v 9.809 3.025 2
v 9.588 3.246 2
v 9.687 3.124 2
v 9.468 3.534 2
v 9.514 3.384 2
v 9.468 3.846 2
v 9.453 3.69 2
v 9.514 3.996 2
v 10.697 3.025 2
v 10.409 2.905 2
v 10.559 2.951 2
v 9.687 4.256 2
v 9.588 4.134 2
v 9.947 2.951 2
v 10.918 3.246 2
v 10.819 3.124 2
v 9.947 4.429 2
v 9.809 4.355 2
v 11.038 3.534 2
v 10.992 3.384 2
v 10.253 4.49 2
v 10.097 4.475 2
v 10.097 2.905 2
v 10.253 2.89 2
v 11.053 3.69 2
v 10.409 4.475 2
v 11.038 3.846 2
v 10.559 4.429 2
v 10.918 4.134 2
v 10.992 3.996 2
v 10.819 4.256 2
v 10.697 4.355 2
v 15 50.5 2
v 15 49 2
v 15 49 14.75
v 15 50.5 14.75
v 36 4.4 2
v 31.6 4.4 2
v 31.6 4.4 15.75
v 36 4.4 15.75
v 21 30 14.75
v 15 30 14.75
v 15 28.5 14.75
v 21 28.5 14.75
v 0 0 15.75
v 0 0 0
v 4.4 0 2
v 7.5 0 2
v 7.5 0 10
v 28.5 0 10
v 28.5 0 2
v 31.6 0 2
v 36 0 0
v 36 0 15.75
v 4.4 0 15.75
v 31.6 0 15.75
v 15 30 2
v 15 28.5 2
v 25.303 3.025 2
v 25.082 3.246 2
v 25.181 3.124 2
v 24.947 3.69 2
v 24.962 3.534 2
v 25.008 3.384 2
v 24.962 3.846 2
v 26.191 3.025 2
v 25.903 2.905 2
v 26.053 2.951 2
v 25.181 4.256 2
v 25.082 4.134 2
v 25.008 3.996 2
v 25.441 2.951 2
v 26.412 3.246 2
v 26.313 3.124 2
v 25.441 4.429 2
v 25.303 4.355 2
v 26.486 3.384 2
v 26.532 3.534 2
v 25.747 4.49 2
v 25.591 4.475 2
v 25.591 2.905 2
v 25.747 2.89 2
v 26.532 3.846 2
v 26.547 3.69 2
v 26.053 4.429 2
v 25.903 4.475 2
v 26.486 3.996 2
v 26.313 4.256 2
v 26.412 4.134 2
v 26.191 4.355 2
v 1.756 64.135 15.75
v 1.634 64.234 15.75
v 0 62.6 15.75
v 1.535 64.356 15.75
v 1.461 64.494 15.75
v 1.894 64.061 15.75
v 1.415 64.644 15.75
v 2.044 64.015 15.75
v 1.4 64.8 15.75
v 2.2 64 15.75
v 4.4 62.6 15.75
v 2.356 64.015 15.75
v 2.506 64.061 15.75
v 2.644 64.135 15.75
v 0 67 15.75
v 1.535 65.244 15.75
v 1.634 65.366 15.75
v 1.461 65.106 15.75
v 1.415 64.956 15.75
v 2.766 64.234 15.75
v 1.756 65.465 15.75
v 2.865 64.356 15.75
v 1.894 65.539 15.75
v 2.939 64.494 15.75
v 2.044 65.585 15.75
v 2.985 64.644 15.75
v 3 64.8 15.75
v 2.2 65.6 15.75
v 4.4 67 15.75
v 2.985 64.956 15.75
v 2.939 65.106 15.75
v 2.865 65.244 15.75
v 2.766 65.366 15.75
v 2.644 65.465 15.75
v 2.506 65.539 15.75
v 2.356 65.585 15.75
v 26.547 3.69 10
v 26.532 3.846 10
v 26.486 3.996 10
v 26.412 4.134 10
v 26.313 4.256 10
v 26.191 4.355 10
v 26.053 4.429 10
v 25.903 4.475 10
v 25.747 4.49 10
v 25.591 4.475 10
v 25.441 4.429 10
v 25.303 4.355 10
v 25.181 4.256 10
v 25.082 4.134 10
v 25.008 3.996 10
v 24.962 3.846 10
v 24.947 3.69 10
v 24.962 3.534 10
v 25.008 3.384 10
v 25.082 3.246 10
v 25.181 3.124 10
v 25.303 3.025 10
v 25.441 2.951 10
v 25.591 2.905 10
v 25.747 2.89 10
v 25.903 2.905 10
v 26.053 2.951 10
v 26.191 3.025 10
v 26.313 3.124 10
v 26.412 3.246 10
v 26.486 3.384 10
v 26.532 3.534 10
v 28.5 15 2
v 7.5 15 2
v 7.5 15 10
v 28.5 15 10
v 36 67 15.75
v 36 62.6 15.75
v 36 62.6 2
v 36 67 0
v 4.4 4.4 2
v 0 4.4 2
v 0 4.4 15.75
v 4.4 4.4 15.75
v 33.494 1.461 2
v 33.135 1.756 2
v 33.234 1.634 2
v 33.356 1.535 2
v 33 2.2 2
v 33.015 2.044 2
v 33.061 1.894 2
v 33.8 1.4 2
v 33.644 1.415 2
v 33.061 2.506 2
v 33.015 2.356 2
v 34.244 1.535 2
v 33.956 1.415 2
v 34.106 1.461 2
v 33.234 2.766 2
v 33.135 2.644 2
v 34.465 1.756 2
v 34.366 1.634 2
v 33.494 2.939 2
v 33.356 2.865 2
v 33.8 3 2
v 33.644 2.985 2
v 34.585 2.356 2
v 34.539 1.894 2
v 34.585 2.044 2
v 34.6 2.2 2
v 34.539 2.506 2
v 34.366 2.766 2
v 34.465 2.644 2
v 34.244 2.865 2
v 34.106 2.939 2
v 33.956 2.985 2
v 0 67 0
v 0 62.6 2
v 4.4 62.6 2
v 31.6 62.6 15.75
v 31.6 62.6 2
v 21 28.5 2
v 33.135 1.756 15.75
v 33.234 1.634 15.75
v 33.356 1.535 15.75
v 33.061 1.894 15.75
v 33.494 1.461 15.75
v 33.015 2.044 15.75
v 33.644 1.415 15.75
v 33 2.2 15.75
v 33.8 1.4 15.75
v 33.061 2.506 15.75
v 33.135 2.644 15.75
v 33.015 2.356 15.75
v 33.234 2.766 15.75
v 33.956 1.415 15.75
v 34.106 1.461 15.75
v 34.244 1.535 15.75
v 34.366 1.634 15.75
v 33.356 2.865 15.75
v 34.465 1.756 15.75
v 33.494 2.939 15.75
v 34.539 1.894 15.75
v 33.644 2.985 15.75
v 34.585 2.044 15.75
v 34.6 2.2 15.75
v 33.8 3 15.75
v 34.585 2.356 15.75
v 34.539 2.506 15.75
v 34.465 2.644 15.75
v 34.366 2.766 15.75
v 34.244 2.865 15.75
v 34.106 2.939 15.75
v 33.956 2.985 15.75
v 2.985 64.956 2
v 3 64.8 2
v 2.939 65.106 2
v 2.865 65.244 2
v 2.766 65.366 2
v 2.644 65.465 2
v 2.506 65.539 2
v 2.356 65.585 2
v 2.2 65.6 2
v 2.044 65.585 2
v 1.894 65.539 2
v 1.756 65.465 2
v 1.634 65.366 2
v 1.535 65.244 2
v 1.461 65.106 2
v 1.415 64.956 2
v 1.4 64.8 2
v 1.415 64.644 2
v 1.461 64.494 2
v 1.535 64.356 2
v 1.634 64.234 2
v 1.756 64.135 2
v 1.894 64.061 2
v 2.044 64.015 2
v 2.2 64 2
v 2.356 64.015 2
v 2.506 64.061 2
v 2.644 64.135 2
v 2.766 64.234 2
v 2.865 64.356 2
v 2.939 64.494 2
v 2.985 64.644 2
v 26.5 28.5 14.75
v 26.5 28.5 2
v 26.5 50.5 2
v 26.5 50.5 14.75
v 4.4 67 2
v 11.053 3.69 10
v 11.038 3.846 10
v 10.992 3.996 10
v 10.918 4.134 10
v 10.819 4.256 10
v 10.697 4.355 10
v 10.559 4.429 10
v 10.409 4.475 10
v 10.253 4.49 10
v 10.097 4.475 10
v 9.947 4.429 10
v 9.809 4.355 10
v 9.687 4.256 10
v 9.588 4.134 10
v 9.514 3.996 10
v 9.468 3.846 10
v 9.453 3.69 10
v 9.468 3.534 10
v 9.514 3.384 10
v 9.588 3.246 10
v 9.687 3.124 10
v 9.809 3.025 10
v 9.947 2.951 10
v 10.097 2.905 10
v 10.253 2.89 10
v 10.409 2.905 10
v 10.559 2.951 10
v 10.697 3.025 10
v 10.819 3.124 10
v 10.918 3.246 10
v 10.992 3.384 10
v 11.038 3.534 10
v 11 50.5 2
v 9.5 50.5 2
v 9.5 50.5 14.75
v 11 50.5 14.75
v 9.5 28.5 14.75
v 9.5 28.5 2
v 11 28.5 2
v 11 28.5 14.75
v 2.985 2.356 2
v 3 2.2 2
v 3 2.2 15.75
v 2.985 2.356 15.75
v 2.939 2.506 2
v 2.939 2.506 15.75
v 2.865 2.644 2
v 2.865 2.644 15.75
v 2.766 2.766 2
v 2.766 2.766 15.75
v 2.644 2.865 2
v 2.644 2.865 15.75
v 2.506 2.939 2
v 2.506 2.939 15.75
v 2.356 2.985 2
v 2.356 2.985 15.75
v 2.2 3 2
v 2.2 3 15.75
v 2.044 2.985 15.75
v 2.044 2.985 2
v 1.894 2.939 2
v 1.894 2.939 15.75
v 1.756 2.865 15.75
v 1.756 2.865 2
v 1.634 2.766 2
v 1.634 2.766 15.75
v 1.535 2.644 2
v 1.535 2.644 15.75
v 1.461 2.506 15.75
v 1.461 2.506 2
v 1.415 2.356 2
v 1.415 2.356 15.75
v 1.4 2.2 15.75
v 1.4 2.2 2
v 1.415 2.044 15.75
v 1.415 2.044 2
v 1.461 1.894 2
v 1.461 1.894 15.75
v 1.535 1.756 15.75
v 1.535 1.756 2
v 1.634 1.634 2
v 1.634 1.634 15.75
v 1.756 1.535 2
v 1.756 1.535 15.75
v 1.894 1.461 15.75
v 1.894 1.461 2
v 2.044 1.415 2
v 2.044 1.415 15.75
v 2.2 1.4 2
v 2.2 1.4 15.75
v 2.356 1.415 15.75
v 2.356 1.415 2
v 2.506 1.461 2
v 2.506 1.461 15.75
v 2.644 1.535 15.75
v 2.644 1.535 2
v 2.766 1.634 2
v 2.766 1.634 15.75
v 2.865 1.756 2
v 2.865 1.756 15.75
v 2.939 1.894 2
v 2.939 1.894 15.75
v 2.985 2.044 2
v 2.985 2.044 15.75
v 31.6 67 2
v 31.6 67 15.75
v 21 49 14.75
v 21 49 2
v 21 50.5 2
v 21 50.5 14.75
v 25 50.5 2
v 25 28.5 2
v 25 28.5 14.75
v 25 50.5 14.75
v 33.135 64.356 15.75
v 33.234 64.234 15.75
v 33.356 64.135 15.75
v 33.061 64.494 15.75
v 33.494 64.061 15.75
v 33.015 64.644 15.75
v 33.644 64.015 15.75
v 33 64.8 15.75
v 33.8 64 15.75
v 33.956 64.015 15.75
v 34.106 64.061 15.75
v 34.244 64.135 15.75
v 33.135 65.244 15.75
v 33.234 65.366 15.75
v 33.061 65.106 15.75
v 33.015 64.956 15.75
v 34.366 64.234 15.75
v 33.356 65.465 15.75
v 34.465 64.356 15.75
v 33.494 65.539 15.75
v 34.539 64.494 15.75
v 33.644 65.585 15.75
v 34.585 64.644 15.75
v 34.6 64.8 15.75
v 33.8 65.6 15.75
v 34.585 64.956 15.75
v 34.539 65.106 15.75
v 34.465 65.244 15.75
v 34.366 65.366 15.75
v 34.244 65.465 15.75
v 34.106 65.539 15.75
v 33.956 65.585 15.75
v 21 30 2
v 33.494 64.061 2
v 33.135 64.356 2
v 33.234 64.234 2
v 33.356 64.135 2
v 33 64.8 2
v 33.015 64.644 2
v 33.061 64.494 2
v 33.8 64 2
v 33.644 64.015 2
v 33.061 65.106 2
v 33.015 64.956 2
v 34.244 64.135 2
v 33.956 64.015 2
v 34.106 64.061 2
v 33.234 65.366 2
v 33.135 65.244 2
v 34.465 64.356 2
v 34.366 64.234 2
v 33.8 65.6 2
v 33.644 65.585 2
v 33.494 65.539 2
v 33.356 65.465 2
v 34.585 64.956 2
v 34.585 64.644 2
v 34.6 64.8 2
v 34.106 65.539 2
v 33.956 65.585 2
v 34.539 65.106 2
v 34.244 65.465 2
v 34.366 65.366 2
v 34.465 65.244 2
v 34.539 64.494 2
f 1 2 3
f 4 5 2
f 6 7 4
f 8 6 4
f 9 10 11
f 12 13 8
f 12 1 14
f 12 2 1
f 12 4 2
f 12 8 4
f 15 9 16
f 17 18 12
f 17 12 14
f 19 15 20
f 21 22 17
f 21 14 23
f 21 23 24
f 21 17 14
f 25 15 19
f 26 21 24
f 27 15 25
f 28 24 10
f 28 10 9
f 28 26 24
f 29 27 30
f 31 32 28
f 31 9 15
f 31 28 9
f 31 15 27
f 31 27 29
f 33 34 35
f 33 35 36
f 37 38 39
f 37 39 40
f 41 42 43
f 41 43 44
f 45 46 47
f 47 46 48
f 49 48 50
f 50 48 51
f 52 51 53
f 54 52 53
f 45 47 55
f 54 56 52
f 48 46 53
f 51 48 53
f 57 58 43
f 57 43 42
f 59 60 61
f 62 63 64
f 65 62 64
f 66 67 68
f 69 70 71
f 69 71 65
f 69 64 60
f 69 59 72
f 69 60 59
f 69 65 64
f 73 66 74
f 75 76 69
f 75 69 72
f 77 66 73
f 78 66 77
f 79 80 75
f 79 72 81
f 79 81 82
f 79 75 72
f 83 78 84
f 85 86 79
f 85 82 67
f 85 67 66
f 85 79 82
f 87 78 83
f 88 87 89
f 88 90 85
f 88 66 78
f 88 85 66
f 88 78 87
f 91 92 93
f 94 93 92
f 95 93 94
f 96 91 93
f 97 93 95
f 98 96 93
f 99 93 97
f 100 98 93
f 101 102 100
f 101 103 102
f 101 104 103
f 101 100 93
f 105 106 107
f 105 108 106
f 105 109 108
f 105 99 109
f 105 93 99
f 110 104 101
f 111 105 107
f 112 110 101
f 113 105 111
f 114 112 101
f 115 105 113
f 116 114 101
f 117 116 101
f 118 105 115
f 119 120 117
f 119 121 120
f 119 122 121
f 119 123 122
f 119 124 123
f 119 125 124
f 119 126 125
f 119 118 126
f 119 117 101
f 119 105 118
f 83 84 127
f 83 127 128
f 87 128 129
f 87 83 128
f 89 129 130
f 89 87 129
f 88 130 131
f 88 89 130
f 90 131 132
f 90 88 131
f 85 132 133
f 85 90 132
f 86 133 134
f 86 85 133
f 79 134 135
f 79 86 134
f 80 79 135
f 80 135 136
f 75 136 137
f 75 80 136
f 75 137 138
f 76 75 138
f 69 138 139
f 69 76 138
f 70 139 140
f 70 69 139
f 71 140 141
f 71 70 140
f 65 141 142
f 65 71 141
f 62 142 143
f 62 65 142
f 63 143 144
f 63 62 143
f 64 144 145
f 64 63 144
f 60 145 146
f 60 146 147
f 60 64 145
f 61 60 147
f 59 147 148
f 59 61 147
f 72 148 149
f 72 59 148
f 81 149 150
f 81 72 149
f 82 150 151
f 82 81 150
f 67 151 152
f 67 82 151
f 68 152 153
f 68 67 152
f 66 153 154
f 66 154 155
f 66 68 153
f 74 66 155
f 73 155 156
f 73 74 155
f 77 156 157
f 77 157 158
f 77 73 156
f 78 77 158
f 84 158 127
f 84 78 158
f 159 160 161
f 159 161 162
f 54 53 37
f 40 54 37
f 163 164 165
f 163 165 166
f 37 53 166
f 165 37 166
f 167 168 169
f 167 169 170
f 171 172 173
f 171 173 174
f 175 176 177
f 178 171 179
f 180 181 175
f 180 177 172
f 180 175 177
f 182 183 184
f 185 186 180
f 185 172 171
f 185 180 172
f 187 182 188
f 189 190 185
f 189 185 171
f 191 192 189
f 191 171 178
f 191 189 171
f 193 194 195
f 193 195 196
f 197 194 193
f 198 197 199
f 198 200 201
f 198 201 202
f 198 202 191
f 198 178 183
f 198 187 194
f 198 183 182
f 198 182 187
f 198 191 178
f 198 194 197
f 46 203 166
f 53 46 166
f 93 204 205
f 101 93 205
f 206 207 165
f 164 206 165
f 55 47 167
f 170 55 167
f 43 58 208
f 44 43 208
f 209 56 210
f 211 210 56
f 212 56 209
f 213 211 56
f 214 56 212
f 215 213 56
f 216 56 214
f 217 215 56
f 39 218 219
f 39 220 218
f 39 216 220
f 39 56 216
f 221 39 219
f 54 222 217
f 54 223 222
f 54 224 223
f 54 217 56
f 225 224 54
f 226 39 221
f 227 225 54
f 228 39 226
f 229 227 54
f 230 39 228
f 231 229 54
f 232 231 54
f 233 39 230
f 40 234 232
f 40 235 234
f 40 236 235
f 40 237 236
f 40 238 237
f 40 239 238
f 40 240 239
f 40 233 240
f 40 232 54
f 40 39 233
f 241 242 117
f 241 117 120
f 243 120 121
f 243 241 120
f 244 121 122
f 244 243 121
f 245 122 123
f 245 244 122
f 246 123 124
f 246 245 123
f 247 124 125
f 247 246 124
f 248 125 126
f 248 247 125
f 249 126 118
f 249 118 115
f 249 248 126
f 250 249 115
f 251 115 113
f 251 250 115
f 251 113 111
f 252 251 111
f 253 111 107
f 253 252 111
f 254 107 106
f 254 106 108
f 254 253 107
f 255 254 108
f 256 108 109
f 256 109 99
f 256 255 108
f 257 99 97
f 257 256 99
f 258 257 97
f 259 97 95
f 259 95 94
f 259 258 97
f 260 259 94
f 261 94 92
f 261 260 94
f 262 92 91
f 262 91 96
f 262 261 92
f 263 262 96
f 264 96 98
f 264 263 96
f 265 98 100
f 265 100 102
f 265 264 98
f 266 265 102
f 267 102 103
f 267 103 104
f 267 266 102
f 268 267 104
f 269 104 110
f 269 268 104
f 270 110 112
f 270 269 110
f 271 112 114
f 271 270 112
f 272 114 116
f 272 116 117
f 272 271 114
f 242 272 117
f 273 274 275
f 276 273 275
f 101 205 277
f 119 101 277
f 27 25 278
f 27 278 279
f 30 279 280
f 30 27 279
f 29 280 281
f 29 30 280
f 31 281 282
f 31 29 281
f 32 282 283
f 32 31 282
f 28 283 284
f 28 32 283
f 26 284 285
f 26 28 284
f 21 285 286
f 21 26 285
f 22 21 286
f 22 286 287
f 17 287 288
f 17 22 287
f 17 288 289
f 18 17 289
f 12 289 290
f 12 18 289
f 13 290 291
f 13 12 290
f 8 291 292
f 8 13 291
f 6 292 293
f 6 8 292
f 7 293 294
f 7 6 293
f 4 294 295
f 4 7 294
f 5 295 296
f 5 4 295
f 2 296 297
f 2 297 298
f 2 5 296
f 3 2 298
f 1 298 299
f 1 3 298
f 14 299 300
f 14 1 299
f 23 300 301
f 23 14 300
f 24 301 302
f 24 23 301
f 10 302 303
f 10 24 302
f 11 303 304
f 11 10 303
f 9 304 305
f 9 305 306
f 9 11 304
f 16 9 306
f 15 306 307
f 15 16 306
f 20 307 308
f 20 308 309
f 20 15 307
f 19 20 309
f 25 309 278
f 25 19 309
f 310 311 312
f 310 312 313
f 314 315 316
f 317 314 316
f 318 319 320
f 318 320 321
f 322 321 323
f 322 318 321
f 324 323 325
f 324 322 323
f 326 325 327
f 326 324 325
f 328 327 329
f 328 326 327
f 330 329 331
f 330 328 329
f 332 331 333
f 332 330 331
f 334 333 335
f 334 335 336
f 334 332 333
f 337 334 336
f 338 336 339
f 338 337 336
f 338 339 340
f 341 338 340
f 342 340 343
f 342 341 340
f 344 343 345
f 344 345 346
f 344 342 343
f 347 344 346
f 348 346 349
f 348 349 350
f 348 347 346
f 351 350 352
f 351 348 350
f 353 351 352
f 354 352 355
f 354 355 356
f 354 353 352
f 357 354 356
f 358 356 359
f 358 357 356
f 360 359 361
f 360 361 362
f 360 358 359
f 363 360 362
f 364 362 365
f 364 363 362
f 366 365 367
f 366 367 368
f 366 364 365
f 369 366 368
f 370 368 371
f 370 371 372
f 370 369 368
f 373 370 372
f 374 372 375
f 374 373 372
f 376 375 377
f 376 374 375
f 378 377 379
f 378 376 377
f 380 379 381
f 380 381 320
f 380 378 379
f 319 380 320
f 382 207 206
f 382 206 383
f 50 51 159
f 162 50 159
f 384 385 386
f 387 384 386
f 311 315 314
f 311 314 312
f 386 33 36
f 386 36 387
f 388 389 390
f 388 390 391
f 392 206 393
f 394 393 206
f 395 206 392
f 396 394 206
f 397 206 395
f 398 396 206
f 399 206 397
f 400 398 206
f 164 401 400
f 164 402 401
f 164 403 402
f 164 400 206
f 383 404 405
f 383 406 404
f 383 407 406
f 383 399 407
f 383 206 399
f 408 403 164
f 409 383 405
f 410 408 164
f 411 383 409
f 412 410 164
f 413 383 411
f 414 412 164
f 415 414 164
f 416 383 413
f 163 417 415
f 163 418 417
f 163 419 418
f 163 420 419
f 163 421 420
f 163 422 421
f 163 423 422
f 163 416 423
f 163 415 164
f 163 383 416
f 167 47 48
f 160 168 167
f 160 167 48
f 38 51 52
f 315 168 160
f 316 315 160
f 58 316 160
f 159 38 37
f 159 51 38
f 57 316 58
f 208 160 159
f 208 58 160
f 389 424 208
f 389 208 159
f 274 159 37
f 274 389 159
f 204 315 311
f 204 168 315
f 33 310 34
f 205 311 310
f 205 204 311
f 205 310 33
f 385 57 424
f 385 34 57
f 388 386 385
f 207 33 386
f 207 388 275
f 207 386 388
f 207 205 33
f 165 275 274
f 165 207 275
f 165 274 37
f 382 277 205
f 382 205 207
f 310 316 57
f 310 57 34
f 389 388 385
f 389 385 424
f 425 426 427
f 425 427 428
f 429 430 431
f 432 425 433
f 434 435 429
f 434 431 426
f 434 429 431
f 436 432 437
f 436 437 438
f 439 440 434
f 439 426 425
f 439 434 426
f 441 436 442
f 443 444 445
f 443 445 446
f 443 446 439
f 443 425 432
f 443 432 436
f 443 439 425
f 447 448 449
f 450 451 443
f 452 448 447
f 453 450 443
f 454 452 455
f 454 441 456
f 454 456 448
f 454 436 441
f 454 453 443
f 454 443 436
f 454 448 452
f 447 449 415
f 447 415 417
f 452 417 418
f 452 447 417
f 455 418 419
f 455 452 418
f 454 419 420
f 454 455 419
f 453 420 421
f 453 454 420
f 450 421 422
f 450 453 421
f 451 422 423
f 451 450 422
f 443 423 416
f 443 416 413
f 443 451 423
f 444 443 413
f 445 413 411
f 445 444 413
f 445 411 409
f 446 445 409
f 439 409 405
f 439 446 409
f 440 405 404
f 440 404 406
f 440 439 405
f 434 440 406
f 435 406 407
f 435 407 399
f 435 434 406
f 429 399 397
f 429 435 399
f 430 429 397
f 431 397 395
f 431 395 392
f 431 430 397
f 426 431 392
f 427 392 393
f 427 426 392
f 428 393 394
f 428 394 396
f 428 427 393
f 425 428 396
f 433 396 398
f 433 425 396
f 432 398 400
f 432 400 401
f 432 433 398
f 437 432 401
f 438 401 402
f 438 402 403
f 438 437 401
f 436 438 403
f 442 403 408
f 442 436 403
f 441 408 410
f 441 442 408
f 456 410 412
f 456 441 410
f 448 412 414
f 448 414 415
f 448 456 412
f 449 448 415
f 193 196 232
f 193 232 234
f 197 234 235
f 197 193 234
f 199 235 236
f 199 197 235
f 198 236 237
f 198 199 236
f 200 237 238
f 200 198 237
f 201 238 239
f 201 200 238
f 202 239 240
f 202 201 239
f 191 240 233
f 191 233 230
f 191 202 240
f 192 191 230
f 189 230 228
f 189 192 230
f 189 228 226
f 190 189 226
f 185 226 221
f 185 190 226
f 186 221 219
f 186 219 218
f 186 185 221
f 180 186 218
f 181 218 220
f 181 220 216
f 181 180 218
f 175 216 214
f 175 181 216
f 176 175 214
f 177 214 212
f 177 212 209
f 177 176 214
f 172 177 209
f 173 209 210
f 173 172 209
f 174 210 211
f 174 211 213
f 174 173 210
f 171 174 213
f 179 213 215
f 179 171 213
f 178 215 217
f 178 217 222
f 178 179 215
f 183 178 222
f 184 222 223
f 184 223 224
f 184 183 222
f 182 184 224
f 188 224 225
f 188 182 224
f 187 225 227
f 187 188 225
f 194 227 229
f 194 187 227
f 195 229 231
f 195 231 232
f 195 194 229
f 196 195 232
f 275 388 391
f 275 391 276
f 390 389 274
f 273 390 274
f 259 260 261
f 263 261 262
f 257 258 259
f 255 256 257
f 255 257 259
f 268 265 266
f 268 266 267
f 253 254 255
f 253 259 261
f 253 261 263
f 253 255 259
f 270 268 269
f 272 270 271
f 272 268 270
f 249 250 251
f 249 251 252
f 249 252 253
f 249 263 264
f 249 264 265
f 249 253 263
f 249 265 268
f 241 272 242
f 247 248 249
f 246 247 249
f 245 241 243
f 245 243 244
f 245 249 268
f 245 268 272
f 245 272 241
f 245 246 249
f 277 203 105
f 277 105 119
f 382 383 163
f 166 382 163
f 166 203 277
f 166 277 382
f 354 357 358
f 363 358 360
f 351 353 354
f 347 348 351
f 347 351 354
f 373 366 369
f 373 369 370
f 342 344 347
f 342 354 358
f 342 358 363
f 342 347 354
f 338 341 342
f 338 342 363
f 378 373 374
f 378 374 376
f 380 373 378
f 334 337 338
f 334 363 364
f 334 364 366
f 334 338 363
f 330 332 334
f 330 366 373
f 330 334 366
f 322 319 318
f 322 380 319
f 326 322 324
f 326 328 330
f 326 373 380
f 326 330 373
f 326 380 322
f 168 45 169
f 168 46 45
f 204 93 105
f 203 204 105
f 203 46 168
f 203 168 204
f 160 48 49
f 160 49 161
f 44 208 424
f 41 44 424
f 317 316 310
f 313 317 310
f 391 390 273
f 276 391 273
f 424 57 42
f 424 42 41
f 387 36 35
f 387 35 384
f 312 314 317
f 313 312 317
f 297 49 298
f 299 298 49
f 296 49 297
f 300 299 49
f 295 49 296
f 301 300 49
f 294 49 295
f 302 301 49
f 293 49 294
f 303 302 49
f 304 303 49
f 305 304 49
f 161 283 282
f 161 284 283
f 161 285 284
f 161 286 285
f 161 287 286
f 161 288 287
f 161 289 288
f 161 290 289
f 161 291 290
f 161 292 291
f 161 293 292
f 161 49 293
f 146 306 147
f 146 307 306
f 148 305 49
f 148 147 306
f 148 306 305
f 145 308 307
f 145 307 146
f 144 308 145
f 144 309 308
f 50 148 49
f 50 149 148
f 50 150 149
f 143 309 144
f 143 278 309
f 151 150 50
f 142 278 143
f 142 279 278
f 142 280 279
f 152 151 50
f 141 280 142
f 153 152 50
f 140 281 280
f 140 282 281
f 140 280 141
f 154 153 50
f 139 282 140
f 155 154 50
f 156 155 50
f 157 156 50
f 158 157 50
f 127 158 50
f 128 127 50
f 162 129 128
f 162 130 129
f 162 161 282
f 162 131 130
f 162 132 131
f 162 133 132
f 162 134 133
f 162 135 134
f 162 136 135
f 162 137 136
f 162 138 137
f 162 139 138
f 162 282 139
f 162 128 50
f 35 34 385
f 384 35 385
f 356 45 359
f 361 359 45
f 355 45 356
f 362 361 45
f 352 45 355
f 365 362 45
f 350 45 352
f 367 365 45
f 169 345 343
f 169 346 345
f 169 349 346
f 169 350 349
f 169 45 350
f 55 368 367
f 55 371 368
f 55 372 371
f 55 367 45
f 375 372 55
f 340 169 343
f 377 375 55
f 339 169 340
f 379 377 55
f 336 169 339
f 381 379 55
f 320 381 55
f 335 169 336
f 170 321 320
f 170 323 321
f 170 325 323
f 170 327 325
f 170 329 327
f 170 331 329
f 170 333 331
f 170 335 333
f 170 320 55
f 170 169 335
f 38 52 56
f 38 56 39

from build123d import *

# Parameters (mm, degrees)
SKETCH_W      = 36
SKETCH_H      = 67
PAD_DEPTH     = 2
SKETCH002_W   = 1.5
SKETCH002_H   = 22
SKETCH002_W_2 = 6
SKETCH002_H_2 = 1.5
PAD001_DEPTH  = 12.75
SKETCH001_W   = 21
SKETCH001_H   = 15
SKETCH001_R   = 0.8
PAD006_DEPTH  = 8
SKETCH018_W   = 4.4
SKETCH018_H   = 4.4
SKETCH018_R   = 0.8
PAD020_DEPTH  = 13.75


with BuildPart() as part:
    # Sketch → Pad (new body)
    with BuildSketch(Plane.XY):
        with Locations((18, 33.5)):
            Rectangle(SKETCH_W, SKETCH_H)
    extrude(amount=PAD_DEPTH)

    # Sketch002 (on DatumPlane) → Pad001 (join)
    with BuildSketch(Plane.XY.offset(2)):
        with Locations((10.25, 39.5)):
            Rectangle(SKETCH002_W, SKETCH002_H)
        with Locations((18, 29.25)):
            Rectangle(SKETCH002_W_2, SKETCH002_H_2)
        with Locations((25.75, 39.5)):
            Rectangle(SKETCH002_W, SKETCH002_H)
        with Locations((18, 49.75)):
            Rectangle(SKETCH002_W_2, SKETCH002_H_2)
    extrude(amount=PAD001_DEPTH)

    # Sketch001 (on DatumPlane) → Pad006 (join)
    with BuildSketch(Plane.XY.offset(2)):
        with Locations((18, 7.5)):
            Rectangle(SKETCH001_W, SKETCH001_H)
        with Locations((10.253, 3.69)):
            Circle(SKETCH001_R, mode=Mode.SUBTRACT)
        with Locations((25.747, 3.69)):
            Circle(SKETCH001_R, mode=Mode.SUBTRACT)
    extrude(amount=PAD006_DEPTH)

    # Sketch018 (on DatumPlane) → Pad020 (join)
    with BuildSketch(Plane.XY.offset(2)):
        with Locations((2.2, 2.2)):
            Rectangle(SKETCH018_W, SKETCH018_H)
        with Locations((2.2, 2.2)):
            Circle(SKETCH018_R, mode=Mode.SUBTRACT)
        with Locations((33.8, 2.2)):
            Rectangle(SKETCH018_W, SKETCH018_H)
        with Locations((33.8, 2.2)):
            Circle(SKETCH018_R, mode=Mode.SUBTRACT)
        with Locations((33.8, 64.8)):
            Rectangle(SKETCH018_W, SKETCH018_H)
        with Locations((33.8, 64.8)):
            Circle(SKETCH018_R, mode=Mode.SUBTRACT)
        with Locations((2.2, 64.8)):
            Rectangle(SKETCH018_W, SKETCH018_H)
        with Locations((2.2, 64.8)):
            Circle(SKETCH018_R, mode=Mode.SUBTRACT)
    extrude(amount=PAD020_DEPTH)


solid = part.part
